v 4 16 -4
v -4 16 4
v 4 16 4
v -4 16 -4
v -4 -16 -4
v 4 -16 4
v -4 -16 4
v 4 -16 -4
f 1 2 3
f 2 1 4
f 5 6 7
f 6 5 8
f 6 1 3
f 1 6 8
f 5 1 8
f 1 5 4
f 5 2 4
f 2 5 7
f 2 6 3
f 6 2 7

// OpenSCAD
size = 32;//block=32 //item=8

rotate([0, 90, 90]) {
  cube([size * 0.25, size * 0.25, size * 1], center = true);
}
;
